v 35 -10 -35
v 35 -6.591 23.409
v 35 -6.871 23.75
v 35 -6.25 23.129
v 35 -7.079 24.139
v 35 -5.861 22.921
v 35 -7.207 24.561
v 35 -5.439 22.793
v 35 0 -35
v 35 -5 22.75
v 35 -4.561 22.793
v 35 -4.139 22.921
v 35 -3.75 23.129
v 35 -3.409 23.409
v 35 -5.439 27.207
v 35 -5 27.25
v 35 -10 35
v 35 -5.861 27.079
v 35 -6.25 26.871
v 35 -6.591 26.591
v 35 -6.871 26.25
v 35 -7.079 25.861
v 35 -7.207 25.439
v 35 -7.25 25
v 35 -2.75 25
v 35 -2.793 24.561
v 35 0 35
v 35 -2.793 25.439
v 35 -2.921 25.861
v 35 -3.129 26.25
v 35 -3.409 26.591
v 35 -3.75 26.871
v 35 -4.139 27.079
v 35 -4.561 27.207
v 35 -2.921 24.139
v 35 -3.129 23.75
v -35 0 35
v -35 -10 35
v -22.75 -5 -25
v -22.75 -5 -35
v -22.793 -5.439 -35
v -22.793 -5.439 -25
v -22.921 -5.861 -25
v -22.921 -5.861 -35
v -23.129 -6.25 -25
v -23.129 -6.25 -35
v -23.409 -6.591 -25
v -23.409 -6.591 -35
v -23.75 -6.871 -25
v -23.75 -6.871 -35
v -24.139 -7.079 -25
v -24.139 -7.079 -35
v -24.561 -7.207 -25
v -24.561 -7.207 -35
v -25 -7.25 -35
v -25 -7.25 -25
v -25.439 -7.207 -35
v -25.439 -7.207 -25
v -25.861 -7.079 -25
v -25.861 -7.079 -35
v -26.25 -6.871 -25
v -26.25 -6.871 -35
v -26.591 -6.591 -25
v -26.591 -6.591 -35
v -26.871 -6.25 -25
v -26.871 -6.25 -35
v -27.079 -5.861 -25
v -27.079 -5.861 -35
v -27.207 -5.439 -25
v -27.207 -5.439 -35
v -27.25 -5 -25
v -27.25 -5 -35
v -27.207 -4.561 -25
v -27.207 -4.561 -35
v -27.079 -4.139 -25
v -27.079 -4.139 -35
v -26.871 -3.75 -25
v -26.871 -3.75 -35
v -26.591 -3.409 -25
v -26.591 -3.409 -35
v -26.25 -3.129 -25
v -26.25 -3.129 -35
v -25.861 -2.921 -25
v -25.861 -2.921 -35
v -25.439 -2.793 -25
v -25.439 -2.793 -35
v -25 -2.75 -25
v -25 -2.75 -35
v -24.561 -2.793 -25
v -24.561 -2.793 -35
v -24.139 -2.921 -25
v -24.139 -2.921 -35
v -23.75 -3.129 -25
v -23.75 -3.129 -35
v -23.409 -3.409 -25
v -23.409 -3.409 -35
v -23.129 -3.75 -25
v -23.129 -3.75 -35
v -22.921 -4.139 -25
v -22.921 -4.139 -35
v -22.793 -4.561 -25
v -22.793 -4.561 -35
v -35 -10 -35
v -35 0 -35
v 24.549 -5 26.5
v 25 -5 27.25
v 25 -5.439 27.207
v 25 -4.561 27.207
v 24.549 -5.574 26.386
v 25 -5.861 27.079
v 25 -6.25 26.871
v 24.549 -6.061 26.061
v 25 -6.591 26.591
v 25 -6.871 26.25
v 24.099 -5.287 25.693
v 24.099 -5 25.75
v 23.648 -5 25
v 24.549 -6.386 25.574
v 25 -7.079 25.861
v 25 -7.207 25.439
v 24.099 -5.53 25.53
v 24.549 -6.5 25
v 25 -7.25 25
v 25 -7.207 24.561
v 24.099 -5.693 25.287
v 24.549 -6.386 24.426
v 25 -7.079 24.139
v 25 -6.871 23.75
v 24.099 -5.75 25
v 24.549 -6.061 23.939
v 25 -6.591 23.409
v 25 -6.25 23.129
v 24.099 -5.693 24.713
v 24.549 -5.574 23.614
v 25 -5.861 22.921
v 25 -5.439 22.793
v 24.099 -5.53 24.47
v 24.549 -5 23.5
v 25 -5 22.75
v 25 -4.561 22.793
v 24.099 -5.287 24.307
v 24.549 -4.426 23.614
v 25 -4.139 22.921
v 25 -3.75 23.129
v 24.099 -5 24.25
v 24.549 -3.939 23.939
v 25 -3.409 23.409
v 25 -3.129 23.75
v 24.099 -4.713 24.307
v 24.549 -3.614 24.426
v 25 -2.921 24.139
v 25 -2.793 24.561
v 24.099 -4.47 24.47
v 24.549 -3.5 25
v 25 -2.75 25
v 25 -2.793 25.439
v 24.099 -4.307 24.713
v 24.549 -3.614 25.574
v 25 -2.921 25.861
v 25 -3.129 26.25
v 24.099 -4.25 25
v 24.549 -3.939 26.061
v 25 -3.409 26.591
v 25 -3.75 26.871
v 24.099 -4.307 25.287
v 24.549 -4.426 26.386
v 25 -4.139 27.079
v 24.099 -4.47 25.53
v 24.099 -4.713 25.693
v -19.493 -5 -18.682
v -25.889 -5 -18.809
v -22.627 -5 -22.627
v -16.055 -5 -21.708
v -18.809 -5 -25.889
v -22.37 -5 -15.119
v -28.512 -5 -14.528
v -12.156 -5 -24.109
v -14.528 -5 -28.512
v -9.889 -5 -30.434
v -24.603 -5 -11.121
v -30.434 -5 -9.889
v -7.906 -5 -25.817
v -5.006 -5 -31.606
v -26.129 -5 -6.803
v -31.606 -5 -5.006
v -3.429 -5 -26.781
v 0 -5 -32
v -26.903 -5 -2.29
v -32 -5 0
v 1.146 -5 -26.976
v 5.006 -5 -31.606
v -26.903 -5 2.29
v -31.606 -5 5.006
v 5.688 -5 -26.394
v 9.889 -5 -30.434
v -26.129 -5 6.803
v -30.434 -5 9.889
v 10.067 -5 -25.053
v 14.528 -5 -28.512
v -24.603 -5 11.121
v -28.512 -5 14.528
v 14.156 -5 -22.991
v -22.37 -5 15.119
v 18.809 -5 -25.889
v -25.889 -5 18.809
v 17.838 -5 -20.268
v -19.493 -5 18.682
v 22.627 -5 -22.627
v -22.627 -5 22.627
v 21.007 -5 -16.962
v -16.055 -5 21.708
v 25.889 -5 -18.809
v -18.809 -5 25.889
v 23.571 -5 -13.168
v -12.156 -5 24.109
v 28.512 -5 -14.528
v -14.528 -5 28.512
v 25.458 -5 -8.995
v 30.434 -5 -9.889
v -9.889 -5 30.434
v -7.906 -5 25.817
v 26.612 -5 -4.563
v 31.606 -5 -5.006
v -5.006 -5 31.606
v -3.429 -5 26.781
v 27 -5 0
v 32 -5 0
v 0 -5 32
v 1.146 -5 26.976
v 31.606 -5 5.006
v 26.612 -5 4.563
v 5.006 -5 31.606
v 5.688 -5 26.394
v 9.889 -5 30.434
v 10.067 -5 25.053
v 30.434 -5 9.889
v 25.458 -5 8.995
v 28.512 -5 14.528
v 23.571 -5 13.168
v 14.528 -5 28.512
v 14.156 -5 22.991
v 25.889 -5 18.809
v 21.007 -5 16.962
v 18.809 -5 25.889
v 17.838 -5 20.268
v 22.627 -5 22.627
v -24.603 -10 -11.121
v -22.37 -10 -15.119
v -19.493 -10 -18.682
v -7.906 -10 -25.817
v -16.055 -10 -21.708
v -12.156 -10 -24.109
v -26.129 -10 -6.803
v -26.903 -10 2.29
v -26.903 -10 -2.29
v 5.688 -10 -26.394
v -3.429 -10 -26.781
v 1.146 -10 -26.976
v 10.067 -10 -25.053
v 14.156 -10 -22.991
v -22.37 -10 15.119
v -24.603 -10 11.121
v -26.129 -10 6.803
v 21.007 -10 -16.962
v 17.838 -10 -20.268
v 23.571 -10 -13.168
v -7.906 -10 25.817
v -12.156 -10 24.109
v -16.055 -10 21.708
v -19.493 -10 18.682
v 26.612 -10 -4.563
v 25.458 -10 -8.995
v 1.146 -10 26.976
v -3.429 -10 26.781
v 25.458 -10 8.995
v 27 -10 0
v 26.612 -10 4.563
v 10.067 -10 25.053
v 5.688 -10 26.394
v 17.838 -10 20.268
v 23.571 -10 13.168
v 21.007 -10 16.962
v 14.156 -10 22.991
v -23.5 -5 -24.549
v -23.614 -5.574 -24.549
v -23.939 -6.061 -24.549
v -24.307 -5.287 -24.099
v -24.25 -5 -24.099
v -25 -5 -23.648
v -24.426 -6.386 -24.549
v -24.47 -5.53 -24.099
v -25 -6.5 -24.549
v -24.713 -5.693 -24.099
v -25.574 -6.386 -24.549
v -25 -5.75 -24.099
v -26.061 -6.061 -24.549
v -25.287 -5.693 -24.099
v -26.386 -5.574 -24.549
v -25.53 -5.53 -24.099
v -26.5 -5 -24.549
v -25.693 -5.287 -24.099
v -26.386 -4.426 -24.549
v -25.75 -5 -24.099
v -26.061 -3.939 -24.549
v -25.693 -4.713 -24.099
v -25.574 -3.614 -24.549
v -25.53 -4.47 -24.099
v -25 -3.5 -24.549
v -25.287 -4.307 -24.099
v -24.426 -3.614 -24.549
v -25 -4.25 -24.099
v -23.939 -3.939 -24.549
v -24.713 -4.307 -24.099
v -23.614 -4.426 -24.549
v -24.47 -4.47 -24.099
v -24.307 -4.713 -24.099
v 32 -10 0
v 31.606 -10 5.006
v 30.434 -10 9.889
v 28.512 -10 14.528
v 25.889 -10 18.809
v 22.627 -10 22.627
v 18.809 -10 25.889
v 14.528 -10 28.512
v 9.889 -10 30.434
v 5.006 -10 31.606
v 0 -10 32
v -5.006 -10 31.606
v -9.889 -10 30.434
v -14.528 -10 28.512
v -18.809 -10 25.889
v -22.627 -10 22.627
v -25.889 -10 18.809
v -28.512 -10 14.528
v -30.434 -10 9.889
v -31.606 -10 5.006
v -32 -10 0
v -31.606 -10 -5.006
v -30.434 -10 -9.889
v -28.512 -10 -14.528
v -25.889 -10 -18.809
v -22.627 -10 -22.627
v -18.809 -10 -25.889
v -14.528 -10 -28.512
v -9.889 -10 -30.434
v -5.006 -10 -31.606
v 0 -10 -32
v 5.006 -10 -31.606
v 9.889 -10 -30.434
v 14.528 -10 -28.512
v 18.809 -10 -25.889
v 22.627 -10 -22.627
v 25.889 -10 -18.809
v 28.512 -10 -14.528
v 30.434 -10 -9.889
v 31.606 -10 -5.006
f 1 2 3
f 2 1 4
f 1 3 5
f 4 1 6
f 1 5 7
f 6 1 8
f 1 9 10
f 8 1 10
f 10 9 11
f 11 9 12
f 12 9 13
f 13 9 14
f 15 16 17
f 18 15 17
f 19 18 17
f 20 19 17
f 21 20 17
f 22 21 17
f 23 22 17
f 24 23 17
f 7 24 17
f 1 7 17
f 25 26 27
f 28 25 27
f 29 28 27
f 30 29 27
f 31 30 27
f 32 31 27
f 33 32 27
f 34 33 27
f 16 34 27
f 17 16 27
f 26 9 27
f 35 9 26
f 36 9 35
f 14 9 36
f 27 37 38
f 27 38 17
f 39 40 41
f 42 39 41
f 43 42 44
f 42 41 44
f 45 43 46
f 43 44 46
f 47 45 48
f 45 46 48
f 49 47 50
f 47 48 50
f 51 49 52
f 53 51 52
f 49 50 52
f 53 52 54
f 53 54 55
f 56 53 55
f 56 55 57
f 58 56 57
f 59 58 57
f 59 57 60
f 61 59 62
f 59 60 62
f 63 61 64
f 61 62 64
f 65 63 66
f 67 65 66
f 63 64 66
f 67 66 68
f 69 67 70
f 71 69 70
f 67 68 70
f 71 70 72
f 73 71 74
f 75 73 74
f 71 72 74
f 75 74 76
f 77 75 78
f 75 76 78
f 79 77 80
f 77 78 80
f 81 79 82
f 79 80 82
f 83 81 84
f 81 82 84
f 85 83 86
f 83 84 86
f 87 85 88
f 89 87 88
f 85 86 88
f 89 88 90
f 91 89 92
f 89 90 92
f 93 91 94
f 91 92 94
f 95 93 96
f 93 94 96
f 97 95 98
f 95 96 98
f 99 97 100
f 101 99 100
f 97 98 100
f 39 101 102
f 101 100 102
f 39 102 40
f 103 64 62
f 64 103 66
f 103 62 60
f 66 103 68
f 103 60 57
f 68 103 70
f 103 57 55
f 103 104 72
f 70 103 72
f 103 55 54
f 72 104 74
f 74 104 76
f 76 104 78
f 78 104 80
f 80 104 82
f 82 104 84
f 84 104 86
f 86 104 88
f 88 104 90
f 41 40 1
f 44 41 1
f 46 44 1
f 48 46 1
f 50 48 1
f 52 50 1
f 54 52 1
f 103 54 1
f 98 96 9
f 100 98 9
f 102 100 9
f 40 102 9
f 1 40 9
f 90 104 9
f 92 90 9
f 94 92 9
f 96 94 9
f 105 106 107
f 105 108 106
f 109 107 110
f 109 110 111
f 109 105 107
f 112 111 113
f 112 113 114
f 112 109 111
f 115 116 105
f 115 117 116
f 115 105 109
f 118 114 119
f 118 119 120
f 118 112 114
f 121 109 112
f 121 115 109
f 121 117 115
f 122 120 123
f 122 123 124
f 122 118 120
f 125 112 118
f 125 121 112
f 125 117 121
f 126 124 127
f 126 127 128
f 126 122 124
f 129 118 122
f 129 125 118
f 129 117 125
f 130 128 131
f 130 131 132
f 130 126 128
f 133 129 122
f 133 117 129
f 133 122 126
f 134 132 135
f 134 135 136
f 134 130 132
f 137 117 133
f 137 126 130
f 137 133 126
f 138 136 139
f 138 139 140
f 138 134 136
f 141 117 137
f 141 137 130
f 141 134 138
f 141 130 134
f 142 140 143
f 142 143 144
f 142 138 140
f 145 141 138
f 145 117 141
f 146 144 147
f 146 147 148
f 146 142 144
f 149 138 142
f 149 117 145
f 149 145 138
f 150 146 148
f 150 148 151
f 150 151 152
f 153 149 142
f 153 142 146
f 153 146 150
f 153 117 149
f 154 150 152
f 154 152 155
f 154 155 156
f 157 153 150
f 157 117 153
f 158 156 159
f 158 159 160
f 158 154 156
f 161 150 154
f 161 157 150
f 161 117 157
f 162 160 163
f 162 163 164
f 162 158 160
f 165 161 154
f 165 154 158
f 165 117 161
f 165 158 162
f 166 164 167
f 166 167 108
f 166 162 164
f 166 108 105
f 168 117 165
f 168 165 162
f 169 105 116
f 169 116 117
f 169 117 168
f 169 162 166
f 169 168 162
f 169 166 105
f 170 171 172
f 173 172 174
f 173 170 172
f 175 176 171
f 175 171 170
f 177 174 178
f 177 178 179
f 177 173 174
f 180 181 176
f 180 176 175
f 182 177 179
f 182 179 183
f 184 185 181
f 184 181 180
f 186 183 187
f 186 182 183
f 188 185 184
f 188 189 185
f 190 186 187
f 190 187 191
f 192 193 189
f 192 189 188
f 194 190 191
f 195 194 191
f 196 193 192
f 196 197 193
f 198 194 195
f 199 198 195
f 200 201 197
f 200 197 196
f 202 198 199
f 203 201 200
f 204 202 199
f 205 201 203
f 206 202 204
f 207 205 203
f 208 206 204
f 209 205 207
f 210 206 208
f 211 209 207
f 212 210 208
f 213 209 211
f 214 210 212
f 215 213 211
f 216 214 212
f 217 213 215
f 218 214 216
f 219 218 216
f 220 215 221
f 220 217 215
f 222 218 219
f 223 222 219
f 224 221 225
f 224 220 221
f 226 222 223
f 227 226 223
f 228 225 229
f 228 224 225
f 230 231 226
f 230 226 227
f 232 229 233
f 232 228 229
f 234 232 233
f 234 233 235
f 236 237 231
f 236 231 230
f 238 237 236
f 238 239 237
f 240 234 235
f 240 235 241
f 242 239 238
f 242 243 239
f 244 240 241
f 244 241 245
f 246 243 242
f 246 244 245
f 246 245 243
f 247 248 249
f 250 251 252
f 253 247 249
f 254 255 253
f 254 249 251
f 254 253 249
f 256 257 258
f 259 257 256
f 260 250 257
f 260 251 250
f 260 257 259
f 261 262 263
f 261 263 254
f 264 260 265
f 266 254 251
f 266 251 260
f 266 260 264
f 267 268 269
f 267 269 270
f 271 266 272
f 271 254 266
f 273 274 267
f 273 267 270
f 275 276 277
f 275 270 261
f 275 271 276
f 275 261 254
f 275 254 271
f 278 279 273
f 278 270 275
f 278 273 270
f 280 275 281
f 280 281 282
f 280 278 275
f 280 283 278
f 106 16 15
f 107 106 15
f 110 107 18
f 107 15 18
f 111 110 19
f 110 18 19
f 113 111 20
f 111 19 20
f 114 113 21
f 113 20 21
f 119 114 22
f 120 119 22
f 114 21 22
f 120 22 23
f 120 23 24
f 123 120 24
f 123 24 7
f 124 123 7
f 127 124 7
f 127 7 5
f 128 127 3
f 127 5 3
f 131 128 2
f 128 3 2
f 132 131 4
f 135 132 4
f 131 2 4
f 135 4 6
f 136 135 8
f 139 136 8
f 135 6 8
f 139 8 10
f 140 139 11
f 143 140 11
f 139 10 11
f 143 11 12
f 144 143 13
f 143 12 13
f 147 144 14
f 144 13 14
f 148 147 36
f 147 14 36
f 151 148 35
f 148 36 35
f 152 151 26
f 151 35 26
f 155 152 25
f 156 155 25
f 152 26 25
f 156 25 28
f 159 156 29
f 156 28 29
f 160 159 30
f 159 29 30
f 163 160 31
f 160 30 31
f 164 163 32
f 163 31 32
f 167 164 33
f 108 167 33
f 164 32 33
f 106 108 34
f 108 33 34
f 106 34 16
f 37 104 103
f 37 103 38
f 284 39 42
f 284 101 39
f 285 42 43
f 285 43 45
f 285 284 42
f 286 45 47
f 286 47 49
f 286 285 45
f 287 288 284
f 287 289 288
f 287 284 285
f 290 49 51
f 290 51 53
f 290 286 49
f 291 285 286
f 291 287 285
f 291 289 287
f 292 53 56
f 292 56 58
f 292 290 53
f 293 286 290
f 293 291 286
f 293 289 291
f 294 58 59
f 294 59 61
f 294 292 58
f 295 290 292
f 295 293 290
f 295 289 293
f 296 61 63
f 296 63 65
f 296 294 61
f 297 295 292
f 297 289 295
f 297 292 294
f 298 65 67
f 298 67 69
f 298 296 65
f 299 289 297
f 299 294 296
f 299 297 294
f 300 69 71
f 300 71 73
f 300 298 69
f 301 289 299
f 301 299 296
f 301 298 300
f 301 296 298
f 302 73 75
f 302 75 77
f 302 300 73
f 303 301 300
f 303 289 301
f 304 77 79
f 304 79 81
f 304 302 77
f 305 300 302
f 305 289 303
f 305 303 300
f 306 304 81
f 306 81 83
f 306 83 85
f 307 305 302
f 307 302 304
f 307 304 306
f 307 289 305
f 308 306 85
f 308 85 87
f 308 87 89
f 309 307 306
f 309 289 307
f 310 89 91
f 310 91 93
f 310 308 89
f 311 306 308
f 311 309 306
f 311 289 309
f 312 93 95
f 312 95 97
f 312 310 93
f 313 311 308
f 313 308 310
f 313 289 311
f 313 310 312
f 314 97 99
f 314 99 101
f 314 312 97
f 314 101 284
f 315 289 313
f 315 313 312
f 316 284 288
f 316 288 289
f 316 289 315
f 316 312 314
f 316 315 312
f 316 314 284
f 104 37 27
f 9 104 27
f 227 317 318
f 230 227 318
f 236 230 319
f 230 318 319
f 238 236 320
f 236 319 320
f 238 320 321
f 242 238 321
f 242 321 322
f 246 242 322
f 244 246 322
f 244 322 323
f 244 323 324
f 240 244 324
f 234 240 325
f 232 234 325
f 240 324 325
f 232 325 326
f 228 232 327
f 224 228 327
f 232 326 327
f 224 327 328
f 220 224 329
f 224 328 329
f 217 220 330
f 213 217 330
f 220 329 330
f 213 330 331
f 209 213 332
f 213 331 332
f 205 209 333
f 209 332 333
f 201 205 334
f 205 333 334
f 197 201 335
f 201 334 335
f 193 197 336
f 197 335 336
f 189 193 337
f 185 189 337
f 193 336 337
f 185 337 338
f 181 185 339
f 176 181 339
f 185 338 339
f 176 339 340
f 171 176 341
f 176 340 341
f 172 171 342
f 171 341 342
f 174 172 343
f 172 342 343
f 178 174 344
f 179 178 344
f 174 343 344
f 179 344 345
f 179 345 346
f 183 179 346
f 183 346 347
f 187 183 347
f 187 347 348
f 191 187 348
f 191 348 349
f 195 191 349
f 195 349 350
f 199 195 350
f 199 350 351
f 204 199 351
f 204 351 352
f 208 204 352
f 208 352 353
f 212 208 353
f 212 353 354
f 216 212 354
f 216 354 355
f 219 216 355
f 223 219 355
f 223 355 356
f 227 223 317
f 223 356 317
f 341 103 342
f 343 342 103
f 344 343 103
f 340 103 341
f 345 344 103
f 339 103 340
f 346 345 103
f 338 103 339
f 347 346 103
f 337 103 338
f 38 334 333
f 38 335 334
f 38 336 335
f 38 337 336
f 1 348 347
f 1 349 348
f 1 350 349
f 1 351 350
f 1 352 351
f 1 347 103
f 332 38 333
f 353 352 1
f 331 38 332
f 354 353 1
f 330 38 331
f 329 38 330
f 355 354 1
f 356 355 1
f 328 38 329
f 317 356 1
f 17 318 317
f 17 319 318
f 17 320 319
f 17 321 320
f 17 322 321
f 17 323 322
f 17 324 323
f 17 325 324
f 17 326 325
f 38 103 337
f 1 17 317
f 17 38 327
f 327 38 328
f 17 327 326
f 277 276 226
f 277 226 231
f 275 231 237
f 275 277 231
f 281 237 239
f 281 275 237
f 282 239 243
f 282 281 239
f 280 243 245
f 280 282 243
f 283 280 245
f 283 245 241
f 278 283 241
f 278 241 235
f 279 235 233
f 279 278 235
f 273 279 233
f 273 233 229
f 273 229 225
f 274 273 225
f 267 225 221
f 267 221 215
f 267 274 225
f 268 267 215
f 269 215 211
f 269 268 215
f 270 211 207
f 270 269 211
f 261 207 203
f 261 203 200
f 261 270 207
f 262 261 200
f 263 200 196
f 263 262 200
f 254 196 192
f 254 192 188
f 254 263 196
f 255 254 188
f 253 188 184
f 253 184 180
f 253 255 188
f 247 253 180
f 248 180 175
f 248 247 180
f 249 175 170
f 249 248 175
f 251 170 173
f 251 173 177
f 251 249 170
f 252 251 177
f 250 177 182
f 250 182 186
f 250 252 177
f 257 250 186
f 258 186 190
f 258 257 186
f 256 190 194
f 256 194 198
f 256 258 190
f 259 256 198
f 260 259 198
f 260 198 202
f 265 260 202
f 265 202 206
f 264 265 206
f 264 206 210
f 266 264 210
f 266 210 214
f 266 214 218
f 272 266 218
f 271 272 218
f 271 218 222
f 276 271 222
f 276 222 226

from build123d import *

# Parameters (mm, degrees)
SKETCH_W       = 70
SKETCH_H       = 70
PAD_DEPTH      = 10
SKETCH001_R    = 32
SKETCH001_R_2  = 27
POCKET_DEPTH   = 5
SKETCH003_R    = 2.25
HOLE_DEPTH     = 10
HOLE_TIPS_R    = 2.25
SKETCH004_R    = 2.25
HOLE001_DEPTH  = 10
HOLE001_TIPS_R = 2.25


with BuildPart() as part:
    # Sketch → Pad (new body)
    with BuildSketch(Plane.XZ):
        Rectangle(SKETCH_W, SKETCH_H)
    extrude(amount=PAD_DEPTH)

    # Sketch001 (on Face6 of Pad) → Pocket (cut)
    with BuildSketch(Plane.XZ.offset(10)):
        Circle(SKETCH001_R)
        Circle(SKETCH001_R_2, mode=Mode.SUBTRACT)
    extrude(amount=-POCKET_DEPTH, mode=Mode.SUBTRACT)

    # Sketch003 (on Face3 of Pocket) → Hole (cut)
    with BuildSketch(Plane(origin=(35, 0, 0), x_dir=(0, 0, 1), z_dir=(1, 0, 0))):
        with Locations((25, 5)):
            Circle(SKETCH003_R)
    extrude(amount=-HOLE_DEPTH, mode=Mode.SUBTRACT)

    # Hole tips → Hole tip 1 section 0
    with BuildSketch(Plane(origin=(25, 0, 0), x_dir=(0, 0, 1), z_dir=(1, 0, 0)), mode=Mode.PRIVATE) as hole_tip_1_s0:
        with Locations((25, 5)):
            Circle(HOLE_TIPS_R)
    loft([hole_tip_1_s0.sketch, Vertex(23.648064, -5, 25)], mode=Mode.SUBTRACT)

    # Sketch004 (on Face6 of Hole) → Hole001 (cut)
    with BuildSketch(Plane(origin=(0, 0, -35), x_dir=(1, 0, 0), z_dir=(0, 0, -1))):
        with Locations((-25, 5)):
            Circle(SKETCH004_R)
    extrude(amount=-HOLE001_DEPTH, mode=Mode.SUBTRACT)

    # Hole001 tips → Hole001 tip 1 section 0
    with BuildSketch(Plane(origin=(0, 0, -25), x_dir=(1, 0, 0), z_dir=(0, 0, -1)), mode=Mode.PRIVATE) as hole001_tip_1_s0:
        with Locations((-25, 5)):
            Circle(HOLE001_TIPS_R)
    loft([hole001_tip_1_s0.sketch, Vertex(-25, -5, -23.648064)], mode=Mode.SUBTRACT)


solid = part.part
